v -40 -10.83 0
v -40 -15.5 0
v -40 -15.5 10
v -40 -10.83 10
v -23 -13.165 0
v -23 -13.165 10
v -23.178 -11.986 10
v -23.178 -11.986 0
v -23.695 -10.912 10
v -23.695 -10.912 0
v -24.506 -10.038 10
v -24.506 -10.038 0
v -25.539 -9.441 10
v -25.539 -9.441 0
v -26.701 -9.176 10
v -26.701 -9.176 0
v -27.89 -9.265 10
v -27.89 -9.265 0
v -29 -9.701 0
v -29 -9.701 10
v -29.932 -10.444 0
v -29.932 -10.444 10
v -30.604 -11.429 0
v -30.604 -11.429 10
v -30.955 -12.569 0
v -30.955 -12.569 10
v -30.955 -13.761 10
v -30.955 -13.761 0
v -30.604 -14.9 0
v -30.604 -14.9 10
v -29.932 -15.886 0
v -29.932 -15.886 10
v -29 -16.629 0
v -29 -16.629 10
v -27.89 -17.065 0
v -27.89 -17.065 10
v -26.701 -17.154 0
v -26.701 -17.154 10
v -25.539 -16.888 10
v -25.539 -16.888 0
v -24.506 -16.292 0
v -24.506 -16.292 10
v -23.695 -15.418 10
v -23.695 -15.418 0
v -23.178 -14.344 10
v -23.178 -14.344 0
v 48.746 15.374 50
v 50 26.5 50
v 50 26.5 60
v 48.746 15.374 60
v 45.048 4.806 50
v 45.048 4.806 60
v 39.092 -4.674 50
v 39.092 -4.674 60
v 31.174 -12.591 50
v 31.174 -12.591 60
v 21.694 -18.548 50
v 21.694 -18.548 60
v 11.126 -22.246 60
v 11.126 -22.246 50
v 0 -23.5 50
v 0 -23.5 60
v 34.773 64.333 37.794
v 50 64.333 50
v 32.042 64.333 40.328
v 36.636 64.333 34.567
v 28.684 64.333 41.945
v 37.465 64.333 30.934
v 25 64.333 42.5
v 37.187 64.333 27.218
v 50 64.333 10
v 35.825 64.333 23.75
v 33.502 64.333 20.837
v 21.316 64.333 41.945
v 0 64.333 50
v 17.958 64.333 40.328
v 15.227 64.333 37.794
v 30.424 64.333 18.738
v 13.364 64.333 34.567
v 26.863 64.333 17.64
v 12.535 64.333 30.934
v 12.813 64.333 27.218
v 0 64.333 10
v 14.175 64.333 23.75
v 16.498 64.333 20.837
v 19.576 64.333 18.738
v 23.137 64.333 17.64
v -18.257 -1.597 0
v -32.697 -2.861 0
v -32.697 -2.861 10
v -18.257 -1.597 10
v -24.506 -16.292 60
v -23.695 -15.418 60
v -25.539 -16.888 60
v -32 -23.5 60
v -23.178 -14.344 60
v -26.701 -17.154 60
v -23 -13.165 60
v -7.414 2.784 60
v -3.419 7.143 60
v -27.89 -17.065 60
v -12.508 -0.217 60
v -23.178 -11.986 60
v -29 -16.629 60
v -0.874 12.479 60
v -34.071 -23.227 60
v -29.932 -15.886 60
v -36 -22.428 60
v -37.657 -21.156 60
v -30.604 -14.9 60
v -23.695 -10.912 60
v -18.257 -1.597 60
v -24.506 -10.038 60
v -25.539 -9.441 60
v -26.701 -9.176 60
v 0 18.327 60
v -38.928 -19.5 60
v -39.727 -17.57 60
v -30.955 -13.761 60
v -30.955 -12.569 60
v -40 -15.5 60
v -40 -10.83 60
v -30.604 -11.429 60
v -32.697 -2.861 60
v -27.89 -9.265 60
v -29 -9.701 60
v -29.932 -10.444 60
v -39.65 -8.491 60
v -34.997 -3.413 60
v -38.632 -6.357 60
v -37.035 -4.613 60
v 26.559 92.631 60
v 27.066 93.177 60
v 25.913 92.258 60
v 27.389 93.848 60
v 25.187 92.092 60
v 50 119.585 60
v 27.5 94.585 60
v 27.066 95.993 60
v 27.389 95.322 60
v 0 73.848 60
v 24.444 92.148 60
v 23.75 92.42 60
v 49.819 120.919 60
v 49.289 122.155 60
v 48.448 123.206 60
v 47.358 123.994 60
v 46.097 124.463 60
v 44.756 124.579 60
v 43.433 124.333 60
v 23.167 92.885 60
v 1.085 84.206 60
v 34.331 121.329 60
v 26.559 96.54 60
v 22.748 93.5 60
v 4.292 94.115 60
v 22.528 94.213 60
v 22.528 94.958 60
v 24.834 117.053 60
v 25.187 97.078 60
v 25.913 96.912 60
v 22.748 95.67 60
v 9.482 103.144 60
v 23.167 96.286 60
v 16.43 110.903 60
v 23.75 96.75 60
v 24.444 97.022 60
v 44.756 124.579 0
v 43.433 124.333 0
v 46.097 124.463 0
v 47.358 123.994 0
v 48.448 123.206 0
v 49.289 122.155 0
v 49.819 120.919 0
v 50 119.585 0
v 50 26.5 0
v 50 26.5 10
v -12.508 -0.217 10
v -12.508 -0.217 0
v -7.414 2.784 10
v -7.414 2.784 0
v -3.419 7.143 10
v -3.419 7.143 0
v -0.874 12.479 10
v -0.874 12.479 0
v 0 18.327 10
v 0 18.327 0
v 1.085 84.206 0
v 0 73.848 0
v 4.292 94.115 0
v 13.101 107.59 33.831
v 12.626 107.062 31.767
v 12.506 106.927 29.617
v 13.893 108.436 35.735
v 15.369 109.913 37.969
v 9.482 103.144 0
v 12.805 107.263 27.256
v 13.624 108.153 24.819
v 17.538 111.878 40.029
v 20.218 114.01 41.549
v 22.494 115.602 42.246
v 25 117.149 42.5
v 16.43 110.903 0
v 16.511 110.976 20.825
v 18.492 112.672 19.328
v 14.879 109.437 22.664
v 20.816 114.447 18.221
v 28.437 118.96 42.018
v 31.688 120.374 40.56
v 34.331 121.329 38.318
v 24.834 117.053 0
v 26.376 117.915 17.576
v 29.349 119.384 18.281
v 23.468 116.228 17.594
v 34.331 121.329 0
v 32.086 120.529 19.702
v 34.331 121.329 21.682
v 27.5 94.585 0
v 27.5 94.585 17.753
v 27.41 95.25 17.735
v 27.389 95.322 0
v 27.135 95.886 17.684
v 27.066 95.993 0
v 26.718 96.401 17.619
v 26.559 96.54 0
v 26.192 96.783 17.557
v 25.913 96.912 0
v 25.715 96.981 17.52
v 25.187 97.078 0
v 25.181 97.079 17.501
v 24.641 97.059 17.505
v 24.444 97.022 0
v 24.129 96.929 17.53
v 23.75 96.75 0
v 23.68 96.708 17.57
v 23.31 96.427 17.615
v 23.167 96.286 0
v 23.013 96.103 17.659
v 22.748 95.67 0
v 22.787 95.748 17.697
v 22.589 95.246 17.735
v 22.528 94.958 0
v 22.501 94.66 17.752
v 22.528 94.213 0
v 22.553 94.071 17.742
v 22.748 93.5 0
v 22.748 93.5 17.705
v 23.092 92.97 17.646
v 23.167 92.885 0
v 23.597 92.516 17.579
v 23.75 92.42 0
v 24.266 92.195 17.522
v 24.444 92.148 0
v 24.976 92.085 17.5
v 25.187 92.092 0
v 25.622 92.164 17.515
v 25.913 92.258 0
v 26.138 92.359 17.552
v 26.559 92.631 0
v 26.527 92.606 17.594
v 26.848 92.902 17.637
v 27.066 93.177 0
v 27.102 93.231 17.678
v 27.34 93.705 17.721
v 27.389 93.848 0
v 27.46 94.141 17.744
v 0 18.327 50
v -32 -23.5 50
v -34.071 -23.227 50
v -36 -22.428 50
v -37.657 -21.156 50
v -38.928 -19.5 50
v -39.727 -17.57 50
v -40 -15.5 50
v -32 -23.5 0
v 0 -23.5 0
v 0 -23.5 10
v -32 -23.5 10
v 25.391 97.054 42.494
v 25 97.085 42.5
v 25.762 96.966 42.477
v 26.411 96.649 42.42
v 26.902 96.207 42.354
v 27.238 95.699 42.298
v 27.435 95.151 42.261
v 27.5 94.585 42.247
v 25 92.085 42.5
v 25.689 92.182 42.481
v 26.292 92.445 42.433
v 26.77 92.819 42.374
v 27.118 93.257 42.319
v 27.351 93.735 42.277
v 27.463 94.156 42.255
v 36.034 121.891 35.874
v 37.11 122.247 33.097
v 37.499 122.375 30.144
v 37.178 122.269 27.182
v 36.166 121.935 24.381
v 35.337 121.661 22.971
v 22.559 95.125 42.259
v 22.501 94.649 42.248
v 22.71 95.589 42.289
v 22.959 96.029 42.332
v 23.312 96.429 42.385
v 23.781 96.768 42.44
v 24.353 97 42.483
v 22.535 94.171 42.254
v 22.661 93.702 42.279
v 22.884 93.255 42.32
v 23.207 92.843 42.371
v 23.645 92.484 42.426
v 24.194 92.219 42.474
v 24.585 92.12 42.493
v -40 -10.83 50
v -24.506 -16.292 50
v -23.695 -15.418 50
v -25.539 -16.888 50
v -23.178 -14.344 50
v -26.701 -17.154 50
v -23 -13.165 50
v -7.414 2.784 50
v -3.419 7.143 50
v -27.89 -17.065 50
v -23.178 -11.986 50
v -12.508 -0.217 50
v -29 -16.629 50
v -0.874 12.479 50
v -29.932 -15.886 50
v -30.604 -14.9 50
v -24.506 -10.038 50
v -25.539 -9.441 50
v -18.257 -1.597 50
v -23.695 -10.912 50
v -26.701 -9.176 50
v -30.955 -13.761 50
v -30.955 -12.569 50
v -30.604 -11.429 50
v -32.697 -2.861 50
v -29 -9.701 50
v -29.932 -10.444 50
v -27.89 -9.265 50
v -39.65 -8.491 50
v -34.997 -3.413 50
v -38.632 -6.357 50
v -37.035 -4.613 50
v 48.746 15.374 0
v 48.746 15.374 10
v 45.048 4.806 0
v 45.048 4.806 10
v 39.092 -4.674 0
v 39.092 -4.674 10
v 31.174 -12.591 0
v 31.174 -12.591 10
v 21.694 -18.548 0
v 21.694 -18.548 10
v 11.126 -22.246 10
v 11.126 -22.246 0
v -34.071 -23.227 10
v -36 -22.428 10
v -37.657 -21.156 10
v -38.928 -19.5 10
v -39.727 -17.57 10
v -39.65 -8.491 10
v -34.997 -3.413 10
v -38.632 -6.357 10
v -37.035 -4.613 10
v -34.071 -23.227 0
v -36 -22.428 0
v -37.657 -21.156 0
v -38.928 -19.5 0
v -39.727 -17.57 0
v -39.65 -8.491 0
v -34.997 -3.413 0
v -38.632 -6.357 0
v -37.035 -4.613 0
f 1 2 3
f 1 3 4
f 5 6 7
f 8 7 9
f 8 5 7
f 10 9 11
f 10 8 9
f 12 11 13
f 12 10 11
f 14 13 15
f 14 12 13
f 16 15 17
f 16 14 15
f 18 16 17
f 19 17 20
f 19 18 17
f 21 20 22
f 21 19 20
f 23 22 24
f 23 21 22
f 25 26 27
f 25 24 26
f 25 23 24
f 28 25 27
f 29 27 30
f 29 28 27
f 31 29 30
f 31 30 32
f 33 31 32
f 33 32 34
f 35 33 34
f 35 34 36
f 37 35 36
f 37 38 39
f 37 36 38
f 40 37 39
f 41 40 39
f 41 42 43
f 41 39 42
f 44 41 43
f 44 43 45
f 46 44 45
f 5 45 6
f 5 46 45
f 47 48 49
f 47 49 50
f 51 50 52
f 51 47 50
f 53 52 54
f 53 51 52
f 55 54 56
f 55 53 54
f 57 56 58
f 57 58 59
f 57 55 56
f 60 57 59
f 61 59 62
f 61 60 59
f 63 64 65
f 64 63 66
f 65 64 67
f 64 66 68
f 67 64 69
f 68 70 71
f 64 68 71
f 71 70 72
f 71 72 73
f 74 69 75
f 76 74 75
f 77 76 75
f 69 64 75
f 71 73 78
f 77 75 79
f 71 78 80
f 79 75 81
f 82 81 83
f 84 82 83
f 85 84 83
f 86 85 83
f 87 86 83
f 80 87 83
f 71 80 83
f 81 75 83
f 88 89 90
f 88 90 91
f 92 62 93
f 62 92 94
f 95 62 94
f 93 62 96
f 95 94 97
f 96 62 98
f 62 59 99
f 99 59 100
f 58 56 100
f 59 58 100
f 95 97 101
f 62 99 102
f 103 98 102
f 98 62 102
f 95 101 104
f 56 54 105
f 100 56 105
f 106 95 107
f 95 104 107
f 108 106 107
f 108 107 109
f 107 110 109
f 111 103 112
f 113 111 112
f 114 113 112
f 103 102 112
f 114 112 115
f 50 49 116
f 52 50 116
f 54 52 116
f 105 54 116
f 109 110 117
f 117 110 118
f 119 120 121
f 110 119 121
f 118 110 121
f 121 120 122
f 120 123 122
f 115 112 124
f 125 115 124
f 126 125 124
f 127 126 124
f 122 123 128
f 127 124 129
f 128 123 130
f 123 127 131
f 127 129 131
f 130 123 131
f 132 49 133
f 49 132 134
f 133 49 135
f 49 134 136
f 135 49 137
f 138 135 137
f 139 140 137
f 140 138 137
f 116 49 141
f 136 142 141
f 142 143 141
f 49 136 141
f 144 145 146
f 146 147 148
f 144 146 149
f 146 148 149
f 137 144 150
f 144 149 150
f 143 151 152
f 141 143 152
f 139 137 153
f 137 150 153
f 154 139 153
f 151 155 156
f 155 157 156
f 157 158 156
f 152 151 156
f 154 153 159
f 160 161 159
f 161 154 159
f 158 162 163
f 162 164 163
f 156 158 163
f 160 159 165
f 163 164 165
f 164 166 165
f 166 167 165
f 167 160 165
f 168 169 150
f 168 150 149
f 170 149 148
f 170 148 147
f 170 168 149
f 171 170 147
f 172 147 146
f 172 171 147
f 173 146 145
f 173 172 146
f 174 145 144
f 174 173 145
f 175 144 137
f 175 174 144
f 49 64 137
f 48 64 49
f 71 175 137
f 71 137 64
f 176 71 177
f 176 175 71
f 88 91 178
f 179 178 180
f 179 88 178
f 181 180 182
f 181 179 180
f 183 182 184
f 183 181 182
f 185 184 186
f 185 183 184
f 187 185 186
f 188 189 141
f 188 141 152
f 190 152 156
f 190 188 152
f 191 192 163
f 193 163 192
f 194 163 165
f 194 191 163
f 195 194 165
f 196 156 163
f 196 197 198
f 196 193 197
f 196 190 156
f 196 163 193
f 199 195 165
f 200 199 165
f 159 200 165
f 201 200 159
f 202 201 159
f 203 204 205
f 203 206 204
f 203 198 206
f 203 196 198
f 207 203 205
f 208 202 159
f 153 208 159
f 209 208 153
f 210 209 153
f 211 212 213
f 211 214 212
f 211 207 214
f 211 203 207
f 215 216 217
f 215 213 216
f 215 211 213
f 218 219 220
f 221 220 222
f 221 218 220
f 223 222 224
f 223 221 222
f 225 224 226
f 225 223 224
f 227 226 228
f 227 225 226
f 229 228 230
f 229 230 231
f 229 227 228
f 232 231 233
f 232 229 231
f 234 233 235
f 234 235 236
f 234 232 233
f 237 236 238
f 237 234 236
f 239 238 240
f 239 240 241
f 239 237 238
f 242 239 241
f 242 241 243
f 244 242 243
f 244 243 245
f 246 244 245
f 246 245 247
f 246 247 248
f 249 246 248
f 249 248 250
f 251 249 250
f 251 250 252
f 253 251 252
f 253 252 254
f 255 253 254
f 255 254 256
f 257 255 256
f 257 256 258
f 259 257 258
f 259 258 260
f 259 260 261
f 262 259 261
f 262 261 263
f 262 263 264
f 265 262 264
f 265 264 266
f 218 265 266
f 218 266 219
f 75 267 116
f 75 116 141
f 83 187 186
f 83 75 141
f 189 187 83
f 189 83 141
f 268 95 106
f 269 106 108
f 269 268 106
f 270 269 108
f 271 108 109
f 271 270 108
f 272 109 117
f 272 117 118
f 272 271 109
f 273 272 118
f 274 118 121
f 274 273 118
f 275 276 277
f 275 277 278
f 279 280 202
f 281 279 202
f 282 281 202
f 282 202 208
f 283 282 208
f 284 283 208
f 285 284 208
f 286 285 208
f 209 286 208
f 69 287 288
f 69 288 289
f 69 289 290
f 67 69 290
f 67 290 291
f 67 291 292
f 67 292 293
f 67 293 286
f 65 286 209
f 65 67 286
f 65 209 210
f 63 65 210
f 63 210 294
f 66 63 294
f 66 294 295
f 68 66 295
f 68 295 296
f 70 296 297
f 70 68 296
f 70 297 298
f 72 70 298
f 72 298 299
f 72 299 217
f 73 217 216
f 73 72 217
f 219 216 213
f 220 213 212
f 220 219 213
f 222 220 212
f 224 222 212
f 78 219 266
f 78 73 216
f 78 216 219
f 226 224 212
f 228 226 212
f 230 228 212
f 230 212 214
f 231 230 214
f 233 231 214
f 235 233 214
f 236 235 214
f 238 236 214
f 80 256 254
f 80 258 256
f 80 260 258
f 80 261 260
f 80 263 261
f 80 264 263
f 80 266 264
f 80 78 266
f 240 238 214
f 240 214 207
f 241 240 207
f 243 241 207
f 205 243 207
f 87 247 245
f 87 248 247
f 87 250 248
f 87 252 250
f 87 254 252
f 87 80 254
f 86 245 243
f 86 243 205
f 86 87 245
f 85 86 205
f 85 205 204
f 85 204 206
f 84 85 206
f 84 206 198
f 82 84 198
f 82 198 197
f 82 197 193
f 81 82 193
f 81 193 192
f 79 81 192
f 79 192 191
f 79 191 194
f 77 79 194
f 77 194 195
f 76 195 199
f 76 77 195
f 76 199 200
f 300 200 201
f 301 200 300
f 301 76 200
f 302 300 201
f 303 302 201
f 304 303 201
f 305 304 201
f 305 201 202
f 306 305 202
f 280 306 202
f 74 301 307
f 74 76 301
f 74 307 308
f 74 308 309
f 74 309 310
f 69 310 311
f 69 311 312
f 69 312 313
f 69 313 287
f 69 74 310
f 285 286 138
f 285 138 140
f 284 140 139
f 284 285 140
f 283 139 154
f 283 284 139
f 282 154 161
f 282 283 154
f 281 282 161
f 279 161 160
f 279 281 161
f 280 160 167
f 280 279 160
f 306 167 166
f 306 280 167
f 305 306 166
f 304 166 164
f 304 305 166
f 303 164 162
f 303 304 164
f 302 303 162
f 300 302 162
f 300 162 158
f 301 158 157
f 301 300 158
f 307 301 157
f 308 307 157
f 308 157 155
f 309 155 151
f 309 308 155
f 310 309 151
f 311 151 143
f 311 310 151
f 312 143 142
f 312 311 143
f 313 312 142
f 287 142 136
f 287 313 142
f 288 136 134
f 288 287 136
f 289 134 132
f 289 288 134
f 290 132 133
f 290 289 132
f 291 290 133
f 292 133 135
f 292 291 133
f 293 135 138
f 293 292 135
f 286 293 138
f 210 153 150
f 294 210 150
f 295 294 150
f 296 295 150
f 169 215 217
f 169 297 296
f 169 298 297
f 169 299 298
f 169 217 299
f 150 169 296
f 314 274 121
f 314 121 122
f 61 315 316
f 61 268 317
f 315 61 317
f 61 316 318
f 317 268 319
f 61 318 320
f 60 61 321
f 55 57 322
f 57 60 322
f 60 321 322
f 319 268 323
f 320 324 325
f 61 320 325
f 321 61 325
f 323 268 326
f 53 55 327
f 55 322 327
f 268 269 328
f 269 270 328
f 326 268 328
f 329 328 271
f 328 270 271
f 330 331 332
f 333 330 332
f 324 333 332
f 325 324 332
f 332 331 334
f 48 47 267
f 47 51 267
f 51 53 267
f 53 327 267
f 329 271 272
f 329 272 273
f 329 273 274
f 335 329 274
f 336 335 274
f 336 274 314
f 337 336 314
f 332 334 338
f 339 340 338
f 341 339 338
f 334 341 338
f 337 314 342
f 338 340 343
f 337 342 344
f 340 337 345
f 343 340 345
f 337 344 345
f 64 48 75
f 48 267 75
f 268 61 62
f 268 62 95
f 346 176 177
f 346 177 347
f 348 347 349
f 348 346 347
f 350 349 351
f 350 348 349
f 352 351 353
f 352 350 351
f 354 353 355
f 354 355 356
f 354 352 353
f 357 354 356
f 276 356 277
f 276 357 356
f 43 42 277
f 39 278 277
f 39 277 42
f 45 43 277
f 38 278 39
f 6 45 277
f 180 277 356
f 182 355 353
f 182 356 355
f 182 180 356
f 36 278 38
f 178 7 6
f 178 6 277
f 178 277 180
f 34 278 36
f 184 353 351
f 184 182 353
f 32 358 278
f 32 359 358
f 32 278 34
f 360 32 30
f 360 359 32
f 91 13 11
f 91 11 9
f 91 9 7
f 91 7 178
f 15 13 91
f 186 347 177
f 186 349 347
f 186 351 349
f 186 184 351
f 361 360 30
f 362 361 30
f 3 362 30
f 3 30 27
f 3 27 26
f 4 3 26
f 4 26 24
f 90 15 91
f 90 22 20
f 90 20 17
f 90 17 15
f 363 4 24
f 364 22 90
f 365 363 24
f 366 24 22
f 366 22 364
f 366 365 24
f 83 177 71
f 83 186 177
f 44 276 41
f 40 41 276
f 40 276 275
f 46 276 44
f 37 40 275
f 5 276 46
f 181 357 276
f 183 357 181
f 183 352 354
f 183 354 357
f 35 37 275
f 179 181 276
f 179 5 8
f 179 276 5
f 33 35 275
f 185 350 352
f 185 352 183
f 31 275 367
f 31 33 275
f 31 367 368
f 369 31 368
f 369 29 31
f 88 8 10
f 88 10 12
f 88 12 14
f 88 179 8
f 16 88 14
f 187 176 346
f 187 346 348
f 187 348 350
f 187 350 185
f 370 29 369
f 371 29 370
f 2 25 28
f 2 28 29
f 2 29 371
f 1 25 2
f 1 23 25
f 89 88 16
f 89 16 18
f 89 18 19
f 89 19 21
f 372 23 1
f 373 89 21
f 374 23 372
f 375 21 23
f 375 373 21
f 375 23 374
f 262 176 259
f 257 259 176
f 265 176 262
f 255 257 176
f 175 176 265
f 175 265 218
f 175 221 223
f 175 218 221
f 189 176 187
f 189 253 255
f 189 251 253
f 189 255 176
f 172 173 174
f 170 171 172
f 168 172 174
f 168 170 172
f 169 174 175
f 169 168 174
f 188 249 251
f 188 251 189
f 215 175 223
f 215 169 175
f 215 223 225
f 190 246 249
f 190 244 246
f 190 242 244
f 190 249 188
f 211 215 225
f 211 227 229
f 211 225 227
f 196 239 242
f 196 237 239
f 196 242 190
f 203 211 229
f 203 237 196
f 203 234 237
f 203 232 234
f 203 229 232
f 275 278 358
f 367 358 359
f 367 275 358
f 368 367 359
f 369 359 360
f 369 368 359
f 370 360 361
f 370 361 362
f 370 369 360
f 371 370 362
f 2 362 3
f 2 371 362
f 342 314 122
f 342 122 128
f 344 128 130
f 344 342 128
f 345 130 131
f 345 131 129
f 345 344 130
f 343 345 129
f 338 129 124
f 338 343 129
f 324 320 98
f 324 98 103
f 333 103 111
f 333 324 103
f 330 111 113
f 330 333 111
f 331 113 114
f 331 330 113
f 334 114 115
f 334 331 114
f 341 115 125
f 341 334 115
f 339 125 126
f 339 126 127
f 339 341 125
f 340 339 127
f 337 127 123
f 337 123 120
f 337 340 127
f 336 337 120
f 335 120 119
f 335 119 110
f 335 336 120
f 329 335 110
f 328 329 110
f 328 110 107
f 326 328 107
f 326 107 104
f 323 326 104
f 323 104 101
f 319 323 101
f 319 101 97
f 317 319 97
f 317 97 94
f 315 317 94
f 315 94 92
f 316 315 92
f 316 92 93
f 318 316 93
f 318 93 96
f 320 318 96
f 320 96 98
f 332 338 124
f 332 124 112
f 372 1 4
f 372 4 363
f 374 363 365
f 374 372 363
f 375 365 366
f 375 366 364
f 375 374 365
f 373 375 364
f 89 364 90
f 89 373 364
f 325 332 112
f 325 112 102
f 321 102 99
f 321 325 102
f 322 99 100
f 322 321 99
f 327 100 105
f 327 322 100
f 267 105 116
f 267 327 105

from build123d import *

# Parameters (mm, degrees)
SKETCH1_R               = 4
BOSS_EXTRUDE1_DEPTH     = 60
CUT_EXTRUDE1_DEPTH      = 148.042397089
CUT_EXTRUDE1_DEPTH_BACK = 148.042397089
SKETCH2_W               = 40
SKETCH2_H               = 100
CUT_EXTRUDE2_DEPTH      = 148.042397089
CUT_EXTRUDE2_DEPTH_BACK = 148.042397089
SKETCH4_R               = 12.5
CUT_EXTRUDE3_DEPTH      = 148.04239713
CUT_EXTRUDE3_DEPTH_BACK = 148.04239713
SKETCH5_R               = 2.5


with BuildPart() as part:
    # Sketch1 → Boss-Extrude1 (new body)
    with BuildSketch(Plane.XY):
        with BuildLine():
            Line((0, 18.32662348), (0, 73.848150904))
            ThreePointArc((0, 73.848150904), (9.481713685, 103.144370354), (34.330738963, 121.329455209))
            Line((34.330738963, 121.329455209), (43.433073896, 124.333308288))
            ThreePointArc((43.433073896, 124.333308288), (47.929621945, 123.637006489), (50, 119.585177858))
            Line((50, 119.585177858), (50, 26.500453459))
            ThreePointArc((50, 26.500453459), (35.355339059, -8.8548856), (0, -23.499546541))
            Line((0, -23.499546541), (-32, -23.499546541))
            ThreePointArc((-32, -23.499546541), (-37.656854249, -21.156400791), (-40, -15.499546541))
            Line((-40, -15.499546541), (-40, -10.830195933))
            ThreePointArc((-40, -10.830195933), (-37.898218694, -5.425474272), (-32.697245942, -2.860638348))
            Line((-32.697245942, -2.860638348), (-18.256885145, -1.597270481))
            ThreePointArc((-18.256885145, -1.597270481), (-5.254453264, 4.814819328), (0, 18.32662348))
        make_face()
        with Locations((-27, -13.164871237)):
            Circle(SKETCH1_R, mode=Mode.SUBTRACT)
    extrude(amount=BOSS_EXTRUDE1_DEPTH)

    # Sketch2 → Cut-Extrude1 (cut, two sides: drawn at the far end of the back side and taken through both)
    with BuildSketch(Plane(origin=(0, 0, 0), x_dir=(0, 0, -1), z_dir=(1, 0, 0)).offset(-CUT_EXTRUDE1_DEPTH_BACK)):
        with Locations((-30, 14.333308288)):
            Rectangle(SKETCH2_W, SKETCH2_H)
    extrude(amount=CUT_EXTRUDE1_DEPTH + CUT_EXTRUDE1_DEPTH_BACK, mode=Mode.SUBTRACT)

    # Sketch4 → Cut-Extrude2 (cut, two sides: drawn at the far end of the back side and taken through both)
    with BuildSketch(Plane(origin=(0, 0, 0), x_dir=(1, 0, 0), z_dir=(0, 1, 0)).offset(-CUT_EXTRUDE2_DEPTH_BACK)):
        with Locations(Location((25, -30, 0), (0, 0, 270))):
            Circle(SKETCH4_R)
    extrude(amount=CUT_EXTRUDE2_DEPTH + CUT_EXTRUDE2_DEPTH_BACK, mode=Mode.SUBTRACT)

    # Sketch5 → Cut-Extrude3 (cut, two sides: drawn at the far end of the back side and taken through both)
    with BuildSketch(Plane.XY.offset(60).offset(-CUT_EXTRUDE3_DEPTH_BACK)):
        with Locations((25, 94.585177858)):
            Circle(SKETCH5_R)
    extrude(amount=CUT_EXTRUDE3_DEPTH + CUT_EXTRUDE3_DEPTH_BACK, mode=Mode.SUBTRACT)


solid = part.part
